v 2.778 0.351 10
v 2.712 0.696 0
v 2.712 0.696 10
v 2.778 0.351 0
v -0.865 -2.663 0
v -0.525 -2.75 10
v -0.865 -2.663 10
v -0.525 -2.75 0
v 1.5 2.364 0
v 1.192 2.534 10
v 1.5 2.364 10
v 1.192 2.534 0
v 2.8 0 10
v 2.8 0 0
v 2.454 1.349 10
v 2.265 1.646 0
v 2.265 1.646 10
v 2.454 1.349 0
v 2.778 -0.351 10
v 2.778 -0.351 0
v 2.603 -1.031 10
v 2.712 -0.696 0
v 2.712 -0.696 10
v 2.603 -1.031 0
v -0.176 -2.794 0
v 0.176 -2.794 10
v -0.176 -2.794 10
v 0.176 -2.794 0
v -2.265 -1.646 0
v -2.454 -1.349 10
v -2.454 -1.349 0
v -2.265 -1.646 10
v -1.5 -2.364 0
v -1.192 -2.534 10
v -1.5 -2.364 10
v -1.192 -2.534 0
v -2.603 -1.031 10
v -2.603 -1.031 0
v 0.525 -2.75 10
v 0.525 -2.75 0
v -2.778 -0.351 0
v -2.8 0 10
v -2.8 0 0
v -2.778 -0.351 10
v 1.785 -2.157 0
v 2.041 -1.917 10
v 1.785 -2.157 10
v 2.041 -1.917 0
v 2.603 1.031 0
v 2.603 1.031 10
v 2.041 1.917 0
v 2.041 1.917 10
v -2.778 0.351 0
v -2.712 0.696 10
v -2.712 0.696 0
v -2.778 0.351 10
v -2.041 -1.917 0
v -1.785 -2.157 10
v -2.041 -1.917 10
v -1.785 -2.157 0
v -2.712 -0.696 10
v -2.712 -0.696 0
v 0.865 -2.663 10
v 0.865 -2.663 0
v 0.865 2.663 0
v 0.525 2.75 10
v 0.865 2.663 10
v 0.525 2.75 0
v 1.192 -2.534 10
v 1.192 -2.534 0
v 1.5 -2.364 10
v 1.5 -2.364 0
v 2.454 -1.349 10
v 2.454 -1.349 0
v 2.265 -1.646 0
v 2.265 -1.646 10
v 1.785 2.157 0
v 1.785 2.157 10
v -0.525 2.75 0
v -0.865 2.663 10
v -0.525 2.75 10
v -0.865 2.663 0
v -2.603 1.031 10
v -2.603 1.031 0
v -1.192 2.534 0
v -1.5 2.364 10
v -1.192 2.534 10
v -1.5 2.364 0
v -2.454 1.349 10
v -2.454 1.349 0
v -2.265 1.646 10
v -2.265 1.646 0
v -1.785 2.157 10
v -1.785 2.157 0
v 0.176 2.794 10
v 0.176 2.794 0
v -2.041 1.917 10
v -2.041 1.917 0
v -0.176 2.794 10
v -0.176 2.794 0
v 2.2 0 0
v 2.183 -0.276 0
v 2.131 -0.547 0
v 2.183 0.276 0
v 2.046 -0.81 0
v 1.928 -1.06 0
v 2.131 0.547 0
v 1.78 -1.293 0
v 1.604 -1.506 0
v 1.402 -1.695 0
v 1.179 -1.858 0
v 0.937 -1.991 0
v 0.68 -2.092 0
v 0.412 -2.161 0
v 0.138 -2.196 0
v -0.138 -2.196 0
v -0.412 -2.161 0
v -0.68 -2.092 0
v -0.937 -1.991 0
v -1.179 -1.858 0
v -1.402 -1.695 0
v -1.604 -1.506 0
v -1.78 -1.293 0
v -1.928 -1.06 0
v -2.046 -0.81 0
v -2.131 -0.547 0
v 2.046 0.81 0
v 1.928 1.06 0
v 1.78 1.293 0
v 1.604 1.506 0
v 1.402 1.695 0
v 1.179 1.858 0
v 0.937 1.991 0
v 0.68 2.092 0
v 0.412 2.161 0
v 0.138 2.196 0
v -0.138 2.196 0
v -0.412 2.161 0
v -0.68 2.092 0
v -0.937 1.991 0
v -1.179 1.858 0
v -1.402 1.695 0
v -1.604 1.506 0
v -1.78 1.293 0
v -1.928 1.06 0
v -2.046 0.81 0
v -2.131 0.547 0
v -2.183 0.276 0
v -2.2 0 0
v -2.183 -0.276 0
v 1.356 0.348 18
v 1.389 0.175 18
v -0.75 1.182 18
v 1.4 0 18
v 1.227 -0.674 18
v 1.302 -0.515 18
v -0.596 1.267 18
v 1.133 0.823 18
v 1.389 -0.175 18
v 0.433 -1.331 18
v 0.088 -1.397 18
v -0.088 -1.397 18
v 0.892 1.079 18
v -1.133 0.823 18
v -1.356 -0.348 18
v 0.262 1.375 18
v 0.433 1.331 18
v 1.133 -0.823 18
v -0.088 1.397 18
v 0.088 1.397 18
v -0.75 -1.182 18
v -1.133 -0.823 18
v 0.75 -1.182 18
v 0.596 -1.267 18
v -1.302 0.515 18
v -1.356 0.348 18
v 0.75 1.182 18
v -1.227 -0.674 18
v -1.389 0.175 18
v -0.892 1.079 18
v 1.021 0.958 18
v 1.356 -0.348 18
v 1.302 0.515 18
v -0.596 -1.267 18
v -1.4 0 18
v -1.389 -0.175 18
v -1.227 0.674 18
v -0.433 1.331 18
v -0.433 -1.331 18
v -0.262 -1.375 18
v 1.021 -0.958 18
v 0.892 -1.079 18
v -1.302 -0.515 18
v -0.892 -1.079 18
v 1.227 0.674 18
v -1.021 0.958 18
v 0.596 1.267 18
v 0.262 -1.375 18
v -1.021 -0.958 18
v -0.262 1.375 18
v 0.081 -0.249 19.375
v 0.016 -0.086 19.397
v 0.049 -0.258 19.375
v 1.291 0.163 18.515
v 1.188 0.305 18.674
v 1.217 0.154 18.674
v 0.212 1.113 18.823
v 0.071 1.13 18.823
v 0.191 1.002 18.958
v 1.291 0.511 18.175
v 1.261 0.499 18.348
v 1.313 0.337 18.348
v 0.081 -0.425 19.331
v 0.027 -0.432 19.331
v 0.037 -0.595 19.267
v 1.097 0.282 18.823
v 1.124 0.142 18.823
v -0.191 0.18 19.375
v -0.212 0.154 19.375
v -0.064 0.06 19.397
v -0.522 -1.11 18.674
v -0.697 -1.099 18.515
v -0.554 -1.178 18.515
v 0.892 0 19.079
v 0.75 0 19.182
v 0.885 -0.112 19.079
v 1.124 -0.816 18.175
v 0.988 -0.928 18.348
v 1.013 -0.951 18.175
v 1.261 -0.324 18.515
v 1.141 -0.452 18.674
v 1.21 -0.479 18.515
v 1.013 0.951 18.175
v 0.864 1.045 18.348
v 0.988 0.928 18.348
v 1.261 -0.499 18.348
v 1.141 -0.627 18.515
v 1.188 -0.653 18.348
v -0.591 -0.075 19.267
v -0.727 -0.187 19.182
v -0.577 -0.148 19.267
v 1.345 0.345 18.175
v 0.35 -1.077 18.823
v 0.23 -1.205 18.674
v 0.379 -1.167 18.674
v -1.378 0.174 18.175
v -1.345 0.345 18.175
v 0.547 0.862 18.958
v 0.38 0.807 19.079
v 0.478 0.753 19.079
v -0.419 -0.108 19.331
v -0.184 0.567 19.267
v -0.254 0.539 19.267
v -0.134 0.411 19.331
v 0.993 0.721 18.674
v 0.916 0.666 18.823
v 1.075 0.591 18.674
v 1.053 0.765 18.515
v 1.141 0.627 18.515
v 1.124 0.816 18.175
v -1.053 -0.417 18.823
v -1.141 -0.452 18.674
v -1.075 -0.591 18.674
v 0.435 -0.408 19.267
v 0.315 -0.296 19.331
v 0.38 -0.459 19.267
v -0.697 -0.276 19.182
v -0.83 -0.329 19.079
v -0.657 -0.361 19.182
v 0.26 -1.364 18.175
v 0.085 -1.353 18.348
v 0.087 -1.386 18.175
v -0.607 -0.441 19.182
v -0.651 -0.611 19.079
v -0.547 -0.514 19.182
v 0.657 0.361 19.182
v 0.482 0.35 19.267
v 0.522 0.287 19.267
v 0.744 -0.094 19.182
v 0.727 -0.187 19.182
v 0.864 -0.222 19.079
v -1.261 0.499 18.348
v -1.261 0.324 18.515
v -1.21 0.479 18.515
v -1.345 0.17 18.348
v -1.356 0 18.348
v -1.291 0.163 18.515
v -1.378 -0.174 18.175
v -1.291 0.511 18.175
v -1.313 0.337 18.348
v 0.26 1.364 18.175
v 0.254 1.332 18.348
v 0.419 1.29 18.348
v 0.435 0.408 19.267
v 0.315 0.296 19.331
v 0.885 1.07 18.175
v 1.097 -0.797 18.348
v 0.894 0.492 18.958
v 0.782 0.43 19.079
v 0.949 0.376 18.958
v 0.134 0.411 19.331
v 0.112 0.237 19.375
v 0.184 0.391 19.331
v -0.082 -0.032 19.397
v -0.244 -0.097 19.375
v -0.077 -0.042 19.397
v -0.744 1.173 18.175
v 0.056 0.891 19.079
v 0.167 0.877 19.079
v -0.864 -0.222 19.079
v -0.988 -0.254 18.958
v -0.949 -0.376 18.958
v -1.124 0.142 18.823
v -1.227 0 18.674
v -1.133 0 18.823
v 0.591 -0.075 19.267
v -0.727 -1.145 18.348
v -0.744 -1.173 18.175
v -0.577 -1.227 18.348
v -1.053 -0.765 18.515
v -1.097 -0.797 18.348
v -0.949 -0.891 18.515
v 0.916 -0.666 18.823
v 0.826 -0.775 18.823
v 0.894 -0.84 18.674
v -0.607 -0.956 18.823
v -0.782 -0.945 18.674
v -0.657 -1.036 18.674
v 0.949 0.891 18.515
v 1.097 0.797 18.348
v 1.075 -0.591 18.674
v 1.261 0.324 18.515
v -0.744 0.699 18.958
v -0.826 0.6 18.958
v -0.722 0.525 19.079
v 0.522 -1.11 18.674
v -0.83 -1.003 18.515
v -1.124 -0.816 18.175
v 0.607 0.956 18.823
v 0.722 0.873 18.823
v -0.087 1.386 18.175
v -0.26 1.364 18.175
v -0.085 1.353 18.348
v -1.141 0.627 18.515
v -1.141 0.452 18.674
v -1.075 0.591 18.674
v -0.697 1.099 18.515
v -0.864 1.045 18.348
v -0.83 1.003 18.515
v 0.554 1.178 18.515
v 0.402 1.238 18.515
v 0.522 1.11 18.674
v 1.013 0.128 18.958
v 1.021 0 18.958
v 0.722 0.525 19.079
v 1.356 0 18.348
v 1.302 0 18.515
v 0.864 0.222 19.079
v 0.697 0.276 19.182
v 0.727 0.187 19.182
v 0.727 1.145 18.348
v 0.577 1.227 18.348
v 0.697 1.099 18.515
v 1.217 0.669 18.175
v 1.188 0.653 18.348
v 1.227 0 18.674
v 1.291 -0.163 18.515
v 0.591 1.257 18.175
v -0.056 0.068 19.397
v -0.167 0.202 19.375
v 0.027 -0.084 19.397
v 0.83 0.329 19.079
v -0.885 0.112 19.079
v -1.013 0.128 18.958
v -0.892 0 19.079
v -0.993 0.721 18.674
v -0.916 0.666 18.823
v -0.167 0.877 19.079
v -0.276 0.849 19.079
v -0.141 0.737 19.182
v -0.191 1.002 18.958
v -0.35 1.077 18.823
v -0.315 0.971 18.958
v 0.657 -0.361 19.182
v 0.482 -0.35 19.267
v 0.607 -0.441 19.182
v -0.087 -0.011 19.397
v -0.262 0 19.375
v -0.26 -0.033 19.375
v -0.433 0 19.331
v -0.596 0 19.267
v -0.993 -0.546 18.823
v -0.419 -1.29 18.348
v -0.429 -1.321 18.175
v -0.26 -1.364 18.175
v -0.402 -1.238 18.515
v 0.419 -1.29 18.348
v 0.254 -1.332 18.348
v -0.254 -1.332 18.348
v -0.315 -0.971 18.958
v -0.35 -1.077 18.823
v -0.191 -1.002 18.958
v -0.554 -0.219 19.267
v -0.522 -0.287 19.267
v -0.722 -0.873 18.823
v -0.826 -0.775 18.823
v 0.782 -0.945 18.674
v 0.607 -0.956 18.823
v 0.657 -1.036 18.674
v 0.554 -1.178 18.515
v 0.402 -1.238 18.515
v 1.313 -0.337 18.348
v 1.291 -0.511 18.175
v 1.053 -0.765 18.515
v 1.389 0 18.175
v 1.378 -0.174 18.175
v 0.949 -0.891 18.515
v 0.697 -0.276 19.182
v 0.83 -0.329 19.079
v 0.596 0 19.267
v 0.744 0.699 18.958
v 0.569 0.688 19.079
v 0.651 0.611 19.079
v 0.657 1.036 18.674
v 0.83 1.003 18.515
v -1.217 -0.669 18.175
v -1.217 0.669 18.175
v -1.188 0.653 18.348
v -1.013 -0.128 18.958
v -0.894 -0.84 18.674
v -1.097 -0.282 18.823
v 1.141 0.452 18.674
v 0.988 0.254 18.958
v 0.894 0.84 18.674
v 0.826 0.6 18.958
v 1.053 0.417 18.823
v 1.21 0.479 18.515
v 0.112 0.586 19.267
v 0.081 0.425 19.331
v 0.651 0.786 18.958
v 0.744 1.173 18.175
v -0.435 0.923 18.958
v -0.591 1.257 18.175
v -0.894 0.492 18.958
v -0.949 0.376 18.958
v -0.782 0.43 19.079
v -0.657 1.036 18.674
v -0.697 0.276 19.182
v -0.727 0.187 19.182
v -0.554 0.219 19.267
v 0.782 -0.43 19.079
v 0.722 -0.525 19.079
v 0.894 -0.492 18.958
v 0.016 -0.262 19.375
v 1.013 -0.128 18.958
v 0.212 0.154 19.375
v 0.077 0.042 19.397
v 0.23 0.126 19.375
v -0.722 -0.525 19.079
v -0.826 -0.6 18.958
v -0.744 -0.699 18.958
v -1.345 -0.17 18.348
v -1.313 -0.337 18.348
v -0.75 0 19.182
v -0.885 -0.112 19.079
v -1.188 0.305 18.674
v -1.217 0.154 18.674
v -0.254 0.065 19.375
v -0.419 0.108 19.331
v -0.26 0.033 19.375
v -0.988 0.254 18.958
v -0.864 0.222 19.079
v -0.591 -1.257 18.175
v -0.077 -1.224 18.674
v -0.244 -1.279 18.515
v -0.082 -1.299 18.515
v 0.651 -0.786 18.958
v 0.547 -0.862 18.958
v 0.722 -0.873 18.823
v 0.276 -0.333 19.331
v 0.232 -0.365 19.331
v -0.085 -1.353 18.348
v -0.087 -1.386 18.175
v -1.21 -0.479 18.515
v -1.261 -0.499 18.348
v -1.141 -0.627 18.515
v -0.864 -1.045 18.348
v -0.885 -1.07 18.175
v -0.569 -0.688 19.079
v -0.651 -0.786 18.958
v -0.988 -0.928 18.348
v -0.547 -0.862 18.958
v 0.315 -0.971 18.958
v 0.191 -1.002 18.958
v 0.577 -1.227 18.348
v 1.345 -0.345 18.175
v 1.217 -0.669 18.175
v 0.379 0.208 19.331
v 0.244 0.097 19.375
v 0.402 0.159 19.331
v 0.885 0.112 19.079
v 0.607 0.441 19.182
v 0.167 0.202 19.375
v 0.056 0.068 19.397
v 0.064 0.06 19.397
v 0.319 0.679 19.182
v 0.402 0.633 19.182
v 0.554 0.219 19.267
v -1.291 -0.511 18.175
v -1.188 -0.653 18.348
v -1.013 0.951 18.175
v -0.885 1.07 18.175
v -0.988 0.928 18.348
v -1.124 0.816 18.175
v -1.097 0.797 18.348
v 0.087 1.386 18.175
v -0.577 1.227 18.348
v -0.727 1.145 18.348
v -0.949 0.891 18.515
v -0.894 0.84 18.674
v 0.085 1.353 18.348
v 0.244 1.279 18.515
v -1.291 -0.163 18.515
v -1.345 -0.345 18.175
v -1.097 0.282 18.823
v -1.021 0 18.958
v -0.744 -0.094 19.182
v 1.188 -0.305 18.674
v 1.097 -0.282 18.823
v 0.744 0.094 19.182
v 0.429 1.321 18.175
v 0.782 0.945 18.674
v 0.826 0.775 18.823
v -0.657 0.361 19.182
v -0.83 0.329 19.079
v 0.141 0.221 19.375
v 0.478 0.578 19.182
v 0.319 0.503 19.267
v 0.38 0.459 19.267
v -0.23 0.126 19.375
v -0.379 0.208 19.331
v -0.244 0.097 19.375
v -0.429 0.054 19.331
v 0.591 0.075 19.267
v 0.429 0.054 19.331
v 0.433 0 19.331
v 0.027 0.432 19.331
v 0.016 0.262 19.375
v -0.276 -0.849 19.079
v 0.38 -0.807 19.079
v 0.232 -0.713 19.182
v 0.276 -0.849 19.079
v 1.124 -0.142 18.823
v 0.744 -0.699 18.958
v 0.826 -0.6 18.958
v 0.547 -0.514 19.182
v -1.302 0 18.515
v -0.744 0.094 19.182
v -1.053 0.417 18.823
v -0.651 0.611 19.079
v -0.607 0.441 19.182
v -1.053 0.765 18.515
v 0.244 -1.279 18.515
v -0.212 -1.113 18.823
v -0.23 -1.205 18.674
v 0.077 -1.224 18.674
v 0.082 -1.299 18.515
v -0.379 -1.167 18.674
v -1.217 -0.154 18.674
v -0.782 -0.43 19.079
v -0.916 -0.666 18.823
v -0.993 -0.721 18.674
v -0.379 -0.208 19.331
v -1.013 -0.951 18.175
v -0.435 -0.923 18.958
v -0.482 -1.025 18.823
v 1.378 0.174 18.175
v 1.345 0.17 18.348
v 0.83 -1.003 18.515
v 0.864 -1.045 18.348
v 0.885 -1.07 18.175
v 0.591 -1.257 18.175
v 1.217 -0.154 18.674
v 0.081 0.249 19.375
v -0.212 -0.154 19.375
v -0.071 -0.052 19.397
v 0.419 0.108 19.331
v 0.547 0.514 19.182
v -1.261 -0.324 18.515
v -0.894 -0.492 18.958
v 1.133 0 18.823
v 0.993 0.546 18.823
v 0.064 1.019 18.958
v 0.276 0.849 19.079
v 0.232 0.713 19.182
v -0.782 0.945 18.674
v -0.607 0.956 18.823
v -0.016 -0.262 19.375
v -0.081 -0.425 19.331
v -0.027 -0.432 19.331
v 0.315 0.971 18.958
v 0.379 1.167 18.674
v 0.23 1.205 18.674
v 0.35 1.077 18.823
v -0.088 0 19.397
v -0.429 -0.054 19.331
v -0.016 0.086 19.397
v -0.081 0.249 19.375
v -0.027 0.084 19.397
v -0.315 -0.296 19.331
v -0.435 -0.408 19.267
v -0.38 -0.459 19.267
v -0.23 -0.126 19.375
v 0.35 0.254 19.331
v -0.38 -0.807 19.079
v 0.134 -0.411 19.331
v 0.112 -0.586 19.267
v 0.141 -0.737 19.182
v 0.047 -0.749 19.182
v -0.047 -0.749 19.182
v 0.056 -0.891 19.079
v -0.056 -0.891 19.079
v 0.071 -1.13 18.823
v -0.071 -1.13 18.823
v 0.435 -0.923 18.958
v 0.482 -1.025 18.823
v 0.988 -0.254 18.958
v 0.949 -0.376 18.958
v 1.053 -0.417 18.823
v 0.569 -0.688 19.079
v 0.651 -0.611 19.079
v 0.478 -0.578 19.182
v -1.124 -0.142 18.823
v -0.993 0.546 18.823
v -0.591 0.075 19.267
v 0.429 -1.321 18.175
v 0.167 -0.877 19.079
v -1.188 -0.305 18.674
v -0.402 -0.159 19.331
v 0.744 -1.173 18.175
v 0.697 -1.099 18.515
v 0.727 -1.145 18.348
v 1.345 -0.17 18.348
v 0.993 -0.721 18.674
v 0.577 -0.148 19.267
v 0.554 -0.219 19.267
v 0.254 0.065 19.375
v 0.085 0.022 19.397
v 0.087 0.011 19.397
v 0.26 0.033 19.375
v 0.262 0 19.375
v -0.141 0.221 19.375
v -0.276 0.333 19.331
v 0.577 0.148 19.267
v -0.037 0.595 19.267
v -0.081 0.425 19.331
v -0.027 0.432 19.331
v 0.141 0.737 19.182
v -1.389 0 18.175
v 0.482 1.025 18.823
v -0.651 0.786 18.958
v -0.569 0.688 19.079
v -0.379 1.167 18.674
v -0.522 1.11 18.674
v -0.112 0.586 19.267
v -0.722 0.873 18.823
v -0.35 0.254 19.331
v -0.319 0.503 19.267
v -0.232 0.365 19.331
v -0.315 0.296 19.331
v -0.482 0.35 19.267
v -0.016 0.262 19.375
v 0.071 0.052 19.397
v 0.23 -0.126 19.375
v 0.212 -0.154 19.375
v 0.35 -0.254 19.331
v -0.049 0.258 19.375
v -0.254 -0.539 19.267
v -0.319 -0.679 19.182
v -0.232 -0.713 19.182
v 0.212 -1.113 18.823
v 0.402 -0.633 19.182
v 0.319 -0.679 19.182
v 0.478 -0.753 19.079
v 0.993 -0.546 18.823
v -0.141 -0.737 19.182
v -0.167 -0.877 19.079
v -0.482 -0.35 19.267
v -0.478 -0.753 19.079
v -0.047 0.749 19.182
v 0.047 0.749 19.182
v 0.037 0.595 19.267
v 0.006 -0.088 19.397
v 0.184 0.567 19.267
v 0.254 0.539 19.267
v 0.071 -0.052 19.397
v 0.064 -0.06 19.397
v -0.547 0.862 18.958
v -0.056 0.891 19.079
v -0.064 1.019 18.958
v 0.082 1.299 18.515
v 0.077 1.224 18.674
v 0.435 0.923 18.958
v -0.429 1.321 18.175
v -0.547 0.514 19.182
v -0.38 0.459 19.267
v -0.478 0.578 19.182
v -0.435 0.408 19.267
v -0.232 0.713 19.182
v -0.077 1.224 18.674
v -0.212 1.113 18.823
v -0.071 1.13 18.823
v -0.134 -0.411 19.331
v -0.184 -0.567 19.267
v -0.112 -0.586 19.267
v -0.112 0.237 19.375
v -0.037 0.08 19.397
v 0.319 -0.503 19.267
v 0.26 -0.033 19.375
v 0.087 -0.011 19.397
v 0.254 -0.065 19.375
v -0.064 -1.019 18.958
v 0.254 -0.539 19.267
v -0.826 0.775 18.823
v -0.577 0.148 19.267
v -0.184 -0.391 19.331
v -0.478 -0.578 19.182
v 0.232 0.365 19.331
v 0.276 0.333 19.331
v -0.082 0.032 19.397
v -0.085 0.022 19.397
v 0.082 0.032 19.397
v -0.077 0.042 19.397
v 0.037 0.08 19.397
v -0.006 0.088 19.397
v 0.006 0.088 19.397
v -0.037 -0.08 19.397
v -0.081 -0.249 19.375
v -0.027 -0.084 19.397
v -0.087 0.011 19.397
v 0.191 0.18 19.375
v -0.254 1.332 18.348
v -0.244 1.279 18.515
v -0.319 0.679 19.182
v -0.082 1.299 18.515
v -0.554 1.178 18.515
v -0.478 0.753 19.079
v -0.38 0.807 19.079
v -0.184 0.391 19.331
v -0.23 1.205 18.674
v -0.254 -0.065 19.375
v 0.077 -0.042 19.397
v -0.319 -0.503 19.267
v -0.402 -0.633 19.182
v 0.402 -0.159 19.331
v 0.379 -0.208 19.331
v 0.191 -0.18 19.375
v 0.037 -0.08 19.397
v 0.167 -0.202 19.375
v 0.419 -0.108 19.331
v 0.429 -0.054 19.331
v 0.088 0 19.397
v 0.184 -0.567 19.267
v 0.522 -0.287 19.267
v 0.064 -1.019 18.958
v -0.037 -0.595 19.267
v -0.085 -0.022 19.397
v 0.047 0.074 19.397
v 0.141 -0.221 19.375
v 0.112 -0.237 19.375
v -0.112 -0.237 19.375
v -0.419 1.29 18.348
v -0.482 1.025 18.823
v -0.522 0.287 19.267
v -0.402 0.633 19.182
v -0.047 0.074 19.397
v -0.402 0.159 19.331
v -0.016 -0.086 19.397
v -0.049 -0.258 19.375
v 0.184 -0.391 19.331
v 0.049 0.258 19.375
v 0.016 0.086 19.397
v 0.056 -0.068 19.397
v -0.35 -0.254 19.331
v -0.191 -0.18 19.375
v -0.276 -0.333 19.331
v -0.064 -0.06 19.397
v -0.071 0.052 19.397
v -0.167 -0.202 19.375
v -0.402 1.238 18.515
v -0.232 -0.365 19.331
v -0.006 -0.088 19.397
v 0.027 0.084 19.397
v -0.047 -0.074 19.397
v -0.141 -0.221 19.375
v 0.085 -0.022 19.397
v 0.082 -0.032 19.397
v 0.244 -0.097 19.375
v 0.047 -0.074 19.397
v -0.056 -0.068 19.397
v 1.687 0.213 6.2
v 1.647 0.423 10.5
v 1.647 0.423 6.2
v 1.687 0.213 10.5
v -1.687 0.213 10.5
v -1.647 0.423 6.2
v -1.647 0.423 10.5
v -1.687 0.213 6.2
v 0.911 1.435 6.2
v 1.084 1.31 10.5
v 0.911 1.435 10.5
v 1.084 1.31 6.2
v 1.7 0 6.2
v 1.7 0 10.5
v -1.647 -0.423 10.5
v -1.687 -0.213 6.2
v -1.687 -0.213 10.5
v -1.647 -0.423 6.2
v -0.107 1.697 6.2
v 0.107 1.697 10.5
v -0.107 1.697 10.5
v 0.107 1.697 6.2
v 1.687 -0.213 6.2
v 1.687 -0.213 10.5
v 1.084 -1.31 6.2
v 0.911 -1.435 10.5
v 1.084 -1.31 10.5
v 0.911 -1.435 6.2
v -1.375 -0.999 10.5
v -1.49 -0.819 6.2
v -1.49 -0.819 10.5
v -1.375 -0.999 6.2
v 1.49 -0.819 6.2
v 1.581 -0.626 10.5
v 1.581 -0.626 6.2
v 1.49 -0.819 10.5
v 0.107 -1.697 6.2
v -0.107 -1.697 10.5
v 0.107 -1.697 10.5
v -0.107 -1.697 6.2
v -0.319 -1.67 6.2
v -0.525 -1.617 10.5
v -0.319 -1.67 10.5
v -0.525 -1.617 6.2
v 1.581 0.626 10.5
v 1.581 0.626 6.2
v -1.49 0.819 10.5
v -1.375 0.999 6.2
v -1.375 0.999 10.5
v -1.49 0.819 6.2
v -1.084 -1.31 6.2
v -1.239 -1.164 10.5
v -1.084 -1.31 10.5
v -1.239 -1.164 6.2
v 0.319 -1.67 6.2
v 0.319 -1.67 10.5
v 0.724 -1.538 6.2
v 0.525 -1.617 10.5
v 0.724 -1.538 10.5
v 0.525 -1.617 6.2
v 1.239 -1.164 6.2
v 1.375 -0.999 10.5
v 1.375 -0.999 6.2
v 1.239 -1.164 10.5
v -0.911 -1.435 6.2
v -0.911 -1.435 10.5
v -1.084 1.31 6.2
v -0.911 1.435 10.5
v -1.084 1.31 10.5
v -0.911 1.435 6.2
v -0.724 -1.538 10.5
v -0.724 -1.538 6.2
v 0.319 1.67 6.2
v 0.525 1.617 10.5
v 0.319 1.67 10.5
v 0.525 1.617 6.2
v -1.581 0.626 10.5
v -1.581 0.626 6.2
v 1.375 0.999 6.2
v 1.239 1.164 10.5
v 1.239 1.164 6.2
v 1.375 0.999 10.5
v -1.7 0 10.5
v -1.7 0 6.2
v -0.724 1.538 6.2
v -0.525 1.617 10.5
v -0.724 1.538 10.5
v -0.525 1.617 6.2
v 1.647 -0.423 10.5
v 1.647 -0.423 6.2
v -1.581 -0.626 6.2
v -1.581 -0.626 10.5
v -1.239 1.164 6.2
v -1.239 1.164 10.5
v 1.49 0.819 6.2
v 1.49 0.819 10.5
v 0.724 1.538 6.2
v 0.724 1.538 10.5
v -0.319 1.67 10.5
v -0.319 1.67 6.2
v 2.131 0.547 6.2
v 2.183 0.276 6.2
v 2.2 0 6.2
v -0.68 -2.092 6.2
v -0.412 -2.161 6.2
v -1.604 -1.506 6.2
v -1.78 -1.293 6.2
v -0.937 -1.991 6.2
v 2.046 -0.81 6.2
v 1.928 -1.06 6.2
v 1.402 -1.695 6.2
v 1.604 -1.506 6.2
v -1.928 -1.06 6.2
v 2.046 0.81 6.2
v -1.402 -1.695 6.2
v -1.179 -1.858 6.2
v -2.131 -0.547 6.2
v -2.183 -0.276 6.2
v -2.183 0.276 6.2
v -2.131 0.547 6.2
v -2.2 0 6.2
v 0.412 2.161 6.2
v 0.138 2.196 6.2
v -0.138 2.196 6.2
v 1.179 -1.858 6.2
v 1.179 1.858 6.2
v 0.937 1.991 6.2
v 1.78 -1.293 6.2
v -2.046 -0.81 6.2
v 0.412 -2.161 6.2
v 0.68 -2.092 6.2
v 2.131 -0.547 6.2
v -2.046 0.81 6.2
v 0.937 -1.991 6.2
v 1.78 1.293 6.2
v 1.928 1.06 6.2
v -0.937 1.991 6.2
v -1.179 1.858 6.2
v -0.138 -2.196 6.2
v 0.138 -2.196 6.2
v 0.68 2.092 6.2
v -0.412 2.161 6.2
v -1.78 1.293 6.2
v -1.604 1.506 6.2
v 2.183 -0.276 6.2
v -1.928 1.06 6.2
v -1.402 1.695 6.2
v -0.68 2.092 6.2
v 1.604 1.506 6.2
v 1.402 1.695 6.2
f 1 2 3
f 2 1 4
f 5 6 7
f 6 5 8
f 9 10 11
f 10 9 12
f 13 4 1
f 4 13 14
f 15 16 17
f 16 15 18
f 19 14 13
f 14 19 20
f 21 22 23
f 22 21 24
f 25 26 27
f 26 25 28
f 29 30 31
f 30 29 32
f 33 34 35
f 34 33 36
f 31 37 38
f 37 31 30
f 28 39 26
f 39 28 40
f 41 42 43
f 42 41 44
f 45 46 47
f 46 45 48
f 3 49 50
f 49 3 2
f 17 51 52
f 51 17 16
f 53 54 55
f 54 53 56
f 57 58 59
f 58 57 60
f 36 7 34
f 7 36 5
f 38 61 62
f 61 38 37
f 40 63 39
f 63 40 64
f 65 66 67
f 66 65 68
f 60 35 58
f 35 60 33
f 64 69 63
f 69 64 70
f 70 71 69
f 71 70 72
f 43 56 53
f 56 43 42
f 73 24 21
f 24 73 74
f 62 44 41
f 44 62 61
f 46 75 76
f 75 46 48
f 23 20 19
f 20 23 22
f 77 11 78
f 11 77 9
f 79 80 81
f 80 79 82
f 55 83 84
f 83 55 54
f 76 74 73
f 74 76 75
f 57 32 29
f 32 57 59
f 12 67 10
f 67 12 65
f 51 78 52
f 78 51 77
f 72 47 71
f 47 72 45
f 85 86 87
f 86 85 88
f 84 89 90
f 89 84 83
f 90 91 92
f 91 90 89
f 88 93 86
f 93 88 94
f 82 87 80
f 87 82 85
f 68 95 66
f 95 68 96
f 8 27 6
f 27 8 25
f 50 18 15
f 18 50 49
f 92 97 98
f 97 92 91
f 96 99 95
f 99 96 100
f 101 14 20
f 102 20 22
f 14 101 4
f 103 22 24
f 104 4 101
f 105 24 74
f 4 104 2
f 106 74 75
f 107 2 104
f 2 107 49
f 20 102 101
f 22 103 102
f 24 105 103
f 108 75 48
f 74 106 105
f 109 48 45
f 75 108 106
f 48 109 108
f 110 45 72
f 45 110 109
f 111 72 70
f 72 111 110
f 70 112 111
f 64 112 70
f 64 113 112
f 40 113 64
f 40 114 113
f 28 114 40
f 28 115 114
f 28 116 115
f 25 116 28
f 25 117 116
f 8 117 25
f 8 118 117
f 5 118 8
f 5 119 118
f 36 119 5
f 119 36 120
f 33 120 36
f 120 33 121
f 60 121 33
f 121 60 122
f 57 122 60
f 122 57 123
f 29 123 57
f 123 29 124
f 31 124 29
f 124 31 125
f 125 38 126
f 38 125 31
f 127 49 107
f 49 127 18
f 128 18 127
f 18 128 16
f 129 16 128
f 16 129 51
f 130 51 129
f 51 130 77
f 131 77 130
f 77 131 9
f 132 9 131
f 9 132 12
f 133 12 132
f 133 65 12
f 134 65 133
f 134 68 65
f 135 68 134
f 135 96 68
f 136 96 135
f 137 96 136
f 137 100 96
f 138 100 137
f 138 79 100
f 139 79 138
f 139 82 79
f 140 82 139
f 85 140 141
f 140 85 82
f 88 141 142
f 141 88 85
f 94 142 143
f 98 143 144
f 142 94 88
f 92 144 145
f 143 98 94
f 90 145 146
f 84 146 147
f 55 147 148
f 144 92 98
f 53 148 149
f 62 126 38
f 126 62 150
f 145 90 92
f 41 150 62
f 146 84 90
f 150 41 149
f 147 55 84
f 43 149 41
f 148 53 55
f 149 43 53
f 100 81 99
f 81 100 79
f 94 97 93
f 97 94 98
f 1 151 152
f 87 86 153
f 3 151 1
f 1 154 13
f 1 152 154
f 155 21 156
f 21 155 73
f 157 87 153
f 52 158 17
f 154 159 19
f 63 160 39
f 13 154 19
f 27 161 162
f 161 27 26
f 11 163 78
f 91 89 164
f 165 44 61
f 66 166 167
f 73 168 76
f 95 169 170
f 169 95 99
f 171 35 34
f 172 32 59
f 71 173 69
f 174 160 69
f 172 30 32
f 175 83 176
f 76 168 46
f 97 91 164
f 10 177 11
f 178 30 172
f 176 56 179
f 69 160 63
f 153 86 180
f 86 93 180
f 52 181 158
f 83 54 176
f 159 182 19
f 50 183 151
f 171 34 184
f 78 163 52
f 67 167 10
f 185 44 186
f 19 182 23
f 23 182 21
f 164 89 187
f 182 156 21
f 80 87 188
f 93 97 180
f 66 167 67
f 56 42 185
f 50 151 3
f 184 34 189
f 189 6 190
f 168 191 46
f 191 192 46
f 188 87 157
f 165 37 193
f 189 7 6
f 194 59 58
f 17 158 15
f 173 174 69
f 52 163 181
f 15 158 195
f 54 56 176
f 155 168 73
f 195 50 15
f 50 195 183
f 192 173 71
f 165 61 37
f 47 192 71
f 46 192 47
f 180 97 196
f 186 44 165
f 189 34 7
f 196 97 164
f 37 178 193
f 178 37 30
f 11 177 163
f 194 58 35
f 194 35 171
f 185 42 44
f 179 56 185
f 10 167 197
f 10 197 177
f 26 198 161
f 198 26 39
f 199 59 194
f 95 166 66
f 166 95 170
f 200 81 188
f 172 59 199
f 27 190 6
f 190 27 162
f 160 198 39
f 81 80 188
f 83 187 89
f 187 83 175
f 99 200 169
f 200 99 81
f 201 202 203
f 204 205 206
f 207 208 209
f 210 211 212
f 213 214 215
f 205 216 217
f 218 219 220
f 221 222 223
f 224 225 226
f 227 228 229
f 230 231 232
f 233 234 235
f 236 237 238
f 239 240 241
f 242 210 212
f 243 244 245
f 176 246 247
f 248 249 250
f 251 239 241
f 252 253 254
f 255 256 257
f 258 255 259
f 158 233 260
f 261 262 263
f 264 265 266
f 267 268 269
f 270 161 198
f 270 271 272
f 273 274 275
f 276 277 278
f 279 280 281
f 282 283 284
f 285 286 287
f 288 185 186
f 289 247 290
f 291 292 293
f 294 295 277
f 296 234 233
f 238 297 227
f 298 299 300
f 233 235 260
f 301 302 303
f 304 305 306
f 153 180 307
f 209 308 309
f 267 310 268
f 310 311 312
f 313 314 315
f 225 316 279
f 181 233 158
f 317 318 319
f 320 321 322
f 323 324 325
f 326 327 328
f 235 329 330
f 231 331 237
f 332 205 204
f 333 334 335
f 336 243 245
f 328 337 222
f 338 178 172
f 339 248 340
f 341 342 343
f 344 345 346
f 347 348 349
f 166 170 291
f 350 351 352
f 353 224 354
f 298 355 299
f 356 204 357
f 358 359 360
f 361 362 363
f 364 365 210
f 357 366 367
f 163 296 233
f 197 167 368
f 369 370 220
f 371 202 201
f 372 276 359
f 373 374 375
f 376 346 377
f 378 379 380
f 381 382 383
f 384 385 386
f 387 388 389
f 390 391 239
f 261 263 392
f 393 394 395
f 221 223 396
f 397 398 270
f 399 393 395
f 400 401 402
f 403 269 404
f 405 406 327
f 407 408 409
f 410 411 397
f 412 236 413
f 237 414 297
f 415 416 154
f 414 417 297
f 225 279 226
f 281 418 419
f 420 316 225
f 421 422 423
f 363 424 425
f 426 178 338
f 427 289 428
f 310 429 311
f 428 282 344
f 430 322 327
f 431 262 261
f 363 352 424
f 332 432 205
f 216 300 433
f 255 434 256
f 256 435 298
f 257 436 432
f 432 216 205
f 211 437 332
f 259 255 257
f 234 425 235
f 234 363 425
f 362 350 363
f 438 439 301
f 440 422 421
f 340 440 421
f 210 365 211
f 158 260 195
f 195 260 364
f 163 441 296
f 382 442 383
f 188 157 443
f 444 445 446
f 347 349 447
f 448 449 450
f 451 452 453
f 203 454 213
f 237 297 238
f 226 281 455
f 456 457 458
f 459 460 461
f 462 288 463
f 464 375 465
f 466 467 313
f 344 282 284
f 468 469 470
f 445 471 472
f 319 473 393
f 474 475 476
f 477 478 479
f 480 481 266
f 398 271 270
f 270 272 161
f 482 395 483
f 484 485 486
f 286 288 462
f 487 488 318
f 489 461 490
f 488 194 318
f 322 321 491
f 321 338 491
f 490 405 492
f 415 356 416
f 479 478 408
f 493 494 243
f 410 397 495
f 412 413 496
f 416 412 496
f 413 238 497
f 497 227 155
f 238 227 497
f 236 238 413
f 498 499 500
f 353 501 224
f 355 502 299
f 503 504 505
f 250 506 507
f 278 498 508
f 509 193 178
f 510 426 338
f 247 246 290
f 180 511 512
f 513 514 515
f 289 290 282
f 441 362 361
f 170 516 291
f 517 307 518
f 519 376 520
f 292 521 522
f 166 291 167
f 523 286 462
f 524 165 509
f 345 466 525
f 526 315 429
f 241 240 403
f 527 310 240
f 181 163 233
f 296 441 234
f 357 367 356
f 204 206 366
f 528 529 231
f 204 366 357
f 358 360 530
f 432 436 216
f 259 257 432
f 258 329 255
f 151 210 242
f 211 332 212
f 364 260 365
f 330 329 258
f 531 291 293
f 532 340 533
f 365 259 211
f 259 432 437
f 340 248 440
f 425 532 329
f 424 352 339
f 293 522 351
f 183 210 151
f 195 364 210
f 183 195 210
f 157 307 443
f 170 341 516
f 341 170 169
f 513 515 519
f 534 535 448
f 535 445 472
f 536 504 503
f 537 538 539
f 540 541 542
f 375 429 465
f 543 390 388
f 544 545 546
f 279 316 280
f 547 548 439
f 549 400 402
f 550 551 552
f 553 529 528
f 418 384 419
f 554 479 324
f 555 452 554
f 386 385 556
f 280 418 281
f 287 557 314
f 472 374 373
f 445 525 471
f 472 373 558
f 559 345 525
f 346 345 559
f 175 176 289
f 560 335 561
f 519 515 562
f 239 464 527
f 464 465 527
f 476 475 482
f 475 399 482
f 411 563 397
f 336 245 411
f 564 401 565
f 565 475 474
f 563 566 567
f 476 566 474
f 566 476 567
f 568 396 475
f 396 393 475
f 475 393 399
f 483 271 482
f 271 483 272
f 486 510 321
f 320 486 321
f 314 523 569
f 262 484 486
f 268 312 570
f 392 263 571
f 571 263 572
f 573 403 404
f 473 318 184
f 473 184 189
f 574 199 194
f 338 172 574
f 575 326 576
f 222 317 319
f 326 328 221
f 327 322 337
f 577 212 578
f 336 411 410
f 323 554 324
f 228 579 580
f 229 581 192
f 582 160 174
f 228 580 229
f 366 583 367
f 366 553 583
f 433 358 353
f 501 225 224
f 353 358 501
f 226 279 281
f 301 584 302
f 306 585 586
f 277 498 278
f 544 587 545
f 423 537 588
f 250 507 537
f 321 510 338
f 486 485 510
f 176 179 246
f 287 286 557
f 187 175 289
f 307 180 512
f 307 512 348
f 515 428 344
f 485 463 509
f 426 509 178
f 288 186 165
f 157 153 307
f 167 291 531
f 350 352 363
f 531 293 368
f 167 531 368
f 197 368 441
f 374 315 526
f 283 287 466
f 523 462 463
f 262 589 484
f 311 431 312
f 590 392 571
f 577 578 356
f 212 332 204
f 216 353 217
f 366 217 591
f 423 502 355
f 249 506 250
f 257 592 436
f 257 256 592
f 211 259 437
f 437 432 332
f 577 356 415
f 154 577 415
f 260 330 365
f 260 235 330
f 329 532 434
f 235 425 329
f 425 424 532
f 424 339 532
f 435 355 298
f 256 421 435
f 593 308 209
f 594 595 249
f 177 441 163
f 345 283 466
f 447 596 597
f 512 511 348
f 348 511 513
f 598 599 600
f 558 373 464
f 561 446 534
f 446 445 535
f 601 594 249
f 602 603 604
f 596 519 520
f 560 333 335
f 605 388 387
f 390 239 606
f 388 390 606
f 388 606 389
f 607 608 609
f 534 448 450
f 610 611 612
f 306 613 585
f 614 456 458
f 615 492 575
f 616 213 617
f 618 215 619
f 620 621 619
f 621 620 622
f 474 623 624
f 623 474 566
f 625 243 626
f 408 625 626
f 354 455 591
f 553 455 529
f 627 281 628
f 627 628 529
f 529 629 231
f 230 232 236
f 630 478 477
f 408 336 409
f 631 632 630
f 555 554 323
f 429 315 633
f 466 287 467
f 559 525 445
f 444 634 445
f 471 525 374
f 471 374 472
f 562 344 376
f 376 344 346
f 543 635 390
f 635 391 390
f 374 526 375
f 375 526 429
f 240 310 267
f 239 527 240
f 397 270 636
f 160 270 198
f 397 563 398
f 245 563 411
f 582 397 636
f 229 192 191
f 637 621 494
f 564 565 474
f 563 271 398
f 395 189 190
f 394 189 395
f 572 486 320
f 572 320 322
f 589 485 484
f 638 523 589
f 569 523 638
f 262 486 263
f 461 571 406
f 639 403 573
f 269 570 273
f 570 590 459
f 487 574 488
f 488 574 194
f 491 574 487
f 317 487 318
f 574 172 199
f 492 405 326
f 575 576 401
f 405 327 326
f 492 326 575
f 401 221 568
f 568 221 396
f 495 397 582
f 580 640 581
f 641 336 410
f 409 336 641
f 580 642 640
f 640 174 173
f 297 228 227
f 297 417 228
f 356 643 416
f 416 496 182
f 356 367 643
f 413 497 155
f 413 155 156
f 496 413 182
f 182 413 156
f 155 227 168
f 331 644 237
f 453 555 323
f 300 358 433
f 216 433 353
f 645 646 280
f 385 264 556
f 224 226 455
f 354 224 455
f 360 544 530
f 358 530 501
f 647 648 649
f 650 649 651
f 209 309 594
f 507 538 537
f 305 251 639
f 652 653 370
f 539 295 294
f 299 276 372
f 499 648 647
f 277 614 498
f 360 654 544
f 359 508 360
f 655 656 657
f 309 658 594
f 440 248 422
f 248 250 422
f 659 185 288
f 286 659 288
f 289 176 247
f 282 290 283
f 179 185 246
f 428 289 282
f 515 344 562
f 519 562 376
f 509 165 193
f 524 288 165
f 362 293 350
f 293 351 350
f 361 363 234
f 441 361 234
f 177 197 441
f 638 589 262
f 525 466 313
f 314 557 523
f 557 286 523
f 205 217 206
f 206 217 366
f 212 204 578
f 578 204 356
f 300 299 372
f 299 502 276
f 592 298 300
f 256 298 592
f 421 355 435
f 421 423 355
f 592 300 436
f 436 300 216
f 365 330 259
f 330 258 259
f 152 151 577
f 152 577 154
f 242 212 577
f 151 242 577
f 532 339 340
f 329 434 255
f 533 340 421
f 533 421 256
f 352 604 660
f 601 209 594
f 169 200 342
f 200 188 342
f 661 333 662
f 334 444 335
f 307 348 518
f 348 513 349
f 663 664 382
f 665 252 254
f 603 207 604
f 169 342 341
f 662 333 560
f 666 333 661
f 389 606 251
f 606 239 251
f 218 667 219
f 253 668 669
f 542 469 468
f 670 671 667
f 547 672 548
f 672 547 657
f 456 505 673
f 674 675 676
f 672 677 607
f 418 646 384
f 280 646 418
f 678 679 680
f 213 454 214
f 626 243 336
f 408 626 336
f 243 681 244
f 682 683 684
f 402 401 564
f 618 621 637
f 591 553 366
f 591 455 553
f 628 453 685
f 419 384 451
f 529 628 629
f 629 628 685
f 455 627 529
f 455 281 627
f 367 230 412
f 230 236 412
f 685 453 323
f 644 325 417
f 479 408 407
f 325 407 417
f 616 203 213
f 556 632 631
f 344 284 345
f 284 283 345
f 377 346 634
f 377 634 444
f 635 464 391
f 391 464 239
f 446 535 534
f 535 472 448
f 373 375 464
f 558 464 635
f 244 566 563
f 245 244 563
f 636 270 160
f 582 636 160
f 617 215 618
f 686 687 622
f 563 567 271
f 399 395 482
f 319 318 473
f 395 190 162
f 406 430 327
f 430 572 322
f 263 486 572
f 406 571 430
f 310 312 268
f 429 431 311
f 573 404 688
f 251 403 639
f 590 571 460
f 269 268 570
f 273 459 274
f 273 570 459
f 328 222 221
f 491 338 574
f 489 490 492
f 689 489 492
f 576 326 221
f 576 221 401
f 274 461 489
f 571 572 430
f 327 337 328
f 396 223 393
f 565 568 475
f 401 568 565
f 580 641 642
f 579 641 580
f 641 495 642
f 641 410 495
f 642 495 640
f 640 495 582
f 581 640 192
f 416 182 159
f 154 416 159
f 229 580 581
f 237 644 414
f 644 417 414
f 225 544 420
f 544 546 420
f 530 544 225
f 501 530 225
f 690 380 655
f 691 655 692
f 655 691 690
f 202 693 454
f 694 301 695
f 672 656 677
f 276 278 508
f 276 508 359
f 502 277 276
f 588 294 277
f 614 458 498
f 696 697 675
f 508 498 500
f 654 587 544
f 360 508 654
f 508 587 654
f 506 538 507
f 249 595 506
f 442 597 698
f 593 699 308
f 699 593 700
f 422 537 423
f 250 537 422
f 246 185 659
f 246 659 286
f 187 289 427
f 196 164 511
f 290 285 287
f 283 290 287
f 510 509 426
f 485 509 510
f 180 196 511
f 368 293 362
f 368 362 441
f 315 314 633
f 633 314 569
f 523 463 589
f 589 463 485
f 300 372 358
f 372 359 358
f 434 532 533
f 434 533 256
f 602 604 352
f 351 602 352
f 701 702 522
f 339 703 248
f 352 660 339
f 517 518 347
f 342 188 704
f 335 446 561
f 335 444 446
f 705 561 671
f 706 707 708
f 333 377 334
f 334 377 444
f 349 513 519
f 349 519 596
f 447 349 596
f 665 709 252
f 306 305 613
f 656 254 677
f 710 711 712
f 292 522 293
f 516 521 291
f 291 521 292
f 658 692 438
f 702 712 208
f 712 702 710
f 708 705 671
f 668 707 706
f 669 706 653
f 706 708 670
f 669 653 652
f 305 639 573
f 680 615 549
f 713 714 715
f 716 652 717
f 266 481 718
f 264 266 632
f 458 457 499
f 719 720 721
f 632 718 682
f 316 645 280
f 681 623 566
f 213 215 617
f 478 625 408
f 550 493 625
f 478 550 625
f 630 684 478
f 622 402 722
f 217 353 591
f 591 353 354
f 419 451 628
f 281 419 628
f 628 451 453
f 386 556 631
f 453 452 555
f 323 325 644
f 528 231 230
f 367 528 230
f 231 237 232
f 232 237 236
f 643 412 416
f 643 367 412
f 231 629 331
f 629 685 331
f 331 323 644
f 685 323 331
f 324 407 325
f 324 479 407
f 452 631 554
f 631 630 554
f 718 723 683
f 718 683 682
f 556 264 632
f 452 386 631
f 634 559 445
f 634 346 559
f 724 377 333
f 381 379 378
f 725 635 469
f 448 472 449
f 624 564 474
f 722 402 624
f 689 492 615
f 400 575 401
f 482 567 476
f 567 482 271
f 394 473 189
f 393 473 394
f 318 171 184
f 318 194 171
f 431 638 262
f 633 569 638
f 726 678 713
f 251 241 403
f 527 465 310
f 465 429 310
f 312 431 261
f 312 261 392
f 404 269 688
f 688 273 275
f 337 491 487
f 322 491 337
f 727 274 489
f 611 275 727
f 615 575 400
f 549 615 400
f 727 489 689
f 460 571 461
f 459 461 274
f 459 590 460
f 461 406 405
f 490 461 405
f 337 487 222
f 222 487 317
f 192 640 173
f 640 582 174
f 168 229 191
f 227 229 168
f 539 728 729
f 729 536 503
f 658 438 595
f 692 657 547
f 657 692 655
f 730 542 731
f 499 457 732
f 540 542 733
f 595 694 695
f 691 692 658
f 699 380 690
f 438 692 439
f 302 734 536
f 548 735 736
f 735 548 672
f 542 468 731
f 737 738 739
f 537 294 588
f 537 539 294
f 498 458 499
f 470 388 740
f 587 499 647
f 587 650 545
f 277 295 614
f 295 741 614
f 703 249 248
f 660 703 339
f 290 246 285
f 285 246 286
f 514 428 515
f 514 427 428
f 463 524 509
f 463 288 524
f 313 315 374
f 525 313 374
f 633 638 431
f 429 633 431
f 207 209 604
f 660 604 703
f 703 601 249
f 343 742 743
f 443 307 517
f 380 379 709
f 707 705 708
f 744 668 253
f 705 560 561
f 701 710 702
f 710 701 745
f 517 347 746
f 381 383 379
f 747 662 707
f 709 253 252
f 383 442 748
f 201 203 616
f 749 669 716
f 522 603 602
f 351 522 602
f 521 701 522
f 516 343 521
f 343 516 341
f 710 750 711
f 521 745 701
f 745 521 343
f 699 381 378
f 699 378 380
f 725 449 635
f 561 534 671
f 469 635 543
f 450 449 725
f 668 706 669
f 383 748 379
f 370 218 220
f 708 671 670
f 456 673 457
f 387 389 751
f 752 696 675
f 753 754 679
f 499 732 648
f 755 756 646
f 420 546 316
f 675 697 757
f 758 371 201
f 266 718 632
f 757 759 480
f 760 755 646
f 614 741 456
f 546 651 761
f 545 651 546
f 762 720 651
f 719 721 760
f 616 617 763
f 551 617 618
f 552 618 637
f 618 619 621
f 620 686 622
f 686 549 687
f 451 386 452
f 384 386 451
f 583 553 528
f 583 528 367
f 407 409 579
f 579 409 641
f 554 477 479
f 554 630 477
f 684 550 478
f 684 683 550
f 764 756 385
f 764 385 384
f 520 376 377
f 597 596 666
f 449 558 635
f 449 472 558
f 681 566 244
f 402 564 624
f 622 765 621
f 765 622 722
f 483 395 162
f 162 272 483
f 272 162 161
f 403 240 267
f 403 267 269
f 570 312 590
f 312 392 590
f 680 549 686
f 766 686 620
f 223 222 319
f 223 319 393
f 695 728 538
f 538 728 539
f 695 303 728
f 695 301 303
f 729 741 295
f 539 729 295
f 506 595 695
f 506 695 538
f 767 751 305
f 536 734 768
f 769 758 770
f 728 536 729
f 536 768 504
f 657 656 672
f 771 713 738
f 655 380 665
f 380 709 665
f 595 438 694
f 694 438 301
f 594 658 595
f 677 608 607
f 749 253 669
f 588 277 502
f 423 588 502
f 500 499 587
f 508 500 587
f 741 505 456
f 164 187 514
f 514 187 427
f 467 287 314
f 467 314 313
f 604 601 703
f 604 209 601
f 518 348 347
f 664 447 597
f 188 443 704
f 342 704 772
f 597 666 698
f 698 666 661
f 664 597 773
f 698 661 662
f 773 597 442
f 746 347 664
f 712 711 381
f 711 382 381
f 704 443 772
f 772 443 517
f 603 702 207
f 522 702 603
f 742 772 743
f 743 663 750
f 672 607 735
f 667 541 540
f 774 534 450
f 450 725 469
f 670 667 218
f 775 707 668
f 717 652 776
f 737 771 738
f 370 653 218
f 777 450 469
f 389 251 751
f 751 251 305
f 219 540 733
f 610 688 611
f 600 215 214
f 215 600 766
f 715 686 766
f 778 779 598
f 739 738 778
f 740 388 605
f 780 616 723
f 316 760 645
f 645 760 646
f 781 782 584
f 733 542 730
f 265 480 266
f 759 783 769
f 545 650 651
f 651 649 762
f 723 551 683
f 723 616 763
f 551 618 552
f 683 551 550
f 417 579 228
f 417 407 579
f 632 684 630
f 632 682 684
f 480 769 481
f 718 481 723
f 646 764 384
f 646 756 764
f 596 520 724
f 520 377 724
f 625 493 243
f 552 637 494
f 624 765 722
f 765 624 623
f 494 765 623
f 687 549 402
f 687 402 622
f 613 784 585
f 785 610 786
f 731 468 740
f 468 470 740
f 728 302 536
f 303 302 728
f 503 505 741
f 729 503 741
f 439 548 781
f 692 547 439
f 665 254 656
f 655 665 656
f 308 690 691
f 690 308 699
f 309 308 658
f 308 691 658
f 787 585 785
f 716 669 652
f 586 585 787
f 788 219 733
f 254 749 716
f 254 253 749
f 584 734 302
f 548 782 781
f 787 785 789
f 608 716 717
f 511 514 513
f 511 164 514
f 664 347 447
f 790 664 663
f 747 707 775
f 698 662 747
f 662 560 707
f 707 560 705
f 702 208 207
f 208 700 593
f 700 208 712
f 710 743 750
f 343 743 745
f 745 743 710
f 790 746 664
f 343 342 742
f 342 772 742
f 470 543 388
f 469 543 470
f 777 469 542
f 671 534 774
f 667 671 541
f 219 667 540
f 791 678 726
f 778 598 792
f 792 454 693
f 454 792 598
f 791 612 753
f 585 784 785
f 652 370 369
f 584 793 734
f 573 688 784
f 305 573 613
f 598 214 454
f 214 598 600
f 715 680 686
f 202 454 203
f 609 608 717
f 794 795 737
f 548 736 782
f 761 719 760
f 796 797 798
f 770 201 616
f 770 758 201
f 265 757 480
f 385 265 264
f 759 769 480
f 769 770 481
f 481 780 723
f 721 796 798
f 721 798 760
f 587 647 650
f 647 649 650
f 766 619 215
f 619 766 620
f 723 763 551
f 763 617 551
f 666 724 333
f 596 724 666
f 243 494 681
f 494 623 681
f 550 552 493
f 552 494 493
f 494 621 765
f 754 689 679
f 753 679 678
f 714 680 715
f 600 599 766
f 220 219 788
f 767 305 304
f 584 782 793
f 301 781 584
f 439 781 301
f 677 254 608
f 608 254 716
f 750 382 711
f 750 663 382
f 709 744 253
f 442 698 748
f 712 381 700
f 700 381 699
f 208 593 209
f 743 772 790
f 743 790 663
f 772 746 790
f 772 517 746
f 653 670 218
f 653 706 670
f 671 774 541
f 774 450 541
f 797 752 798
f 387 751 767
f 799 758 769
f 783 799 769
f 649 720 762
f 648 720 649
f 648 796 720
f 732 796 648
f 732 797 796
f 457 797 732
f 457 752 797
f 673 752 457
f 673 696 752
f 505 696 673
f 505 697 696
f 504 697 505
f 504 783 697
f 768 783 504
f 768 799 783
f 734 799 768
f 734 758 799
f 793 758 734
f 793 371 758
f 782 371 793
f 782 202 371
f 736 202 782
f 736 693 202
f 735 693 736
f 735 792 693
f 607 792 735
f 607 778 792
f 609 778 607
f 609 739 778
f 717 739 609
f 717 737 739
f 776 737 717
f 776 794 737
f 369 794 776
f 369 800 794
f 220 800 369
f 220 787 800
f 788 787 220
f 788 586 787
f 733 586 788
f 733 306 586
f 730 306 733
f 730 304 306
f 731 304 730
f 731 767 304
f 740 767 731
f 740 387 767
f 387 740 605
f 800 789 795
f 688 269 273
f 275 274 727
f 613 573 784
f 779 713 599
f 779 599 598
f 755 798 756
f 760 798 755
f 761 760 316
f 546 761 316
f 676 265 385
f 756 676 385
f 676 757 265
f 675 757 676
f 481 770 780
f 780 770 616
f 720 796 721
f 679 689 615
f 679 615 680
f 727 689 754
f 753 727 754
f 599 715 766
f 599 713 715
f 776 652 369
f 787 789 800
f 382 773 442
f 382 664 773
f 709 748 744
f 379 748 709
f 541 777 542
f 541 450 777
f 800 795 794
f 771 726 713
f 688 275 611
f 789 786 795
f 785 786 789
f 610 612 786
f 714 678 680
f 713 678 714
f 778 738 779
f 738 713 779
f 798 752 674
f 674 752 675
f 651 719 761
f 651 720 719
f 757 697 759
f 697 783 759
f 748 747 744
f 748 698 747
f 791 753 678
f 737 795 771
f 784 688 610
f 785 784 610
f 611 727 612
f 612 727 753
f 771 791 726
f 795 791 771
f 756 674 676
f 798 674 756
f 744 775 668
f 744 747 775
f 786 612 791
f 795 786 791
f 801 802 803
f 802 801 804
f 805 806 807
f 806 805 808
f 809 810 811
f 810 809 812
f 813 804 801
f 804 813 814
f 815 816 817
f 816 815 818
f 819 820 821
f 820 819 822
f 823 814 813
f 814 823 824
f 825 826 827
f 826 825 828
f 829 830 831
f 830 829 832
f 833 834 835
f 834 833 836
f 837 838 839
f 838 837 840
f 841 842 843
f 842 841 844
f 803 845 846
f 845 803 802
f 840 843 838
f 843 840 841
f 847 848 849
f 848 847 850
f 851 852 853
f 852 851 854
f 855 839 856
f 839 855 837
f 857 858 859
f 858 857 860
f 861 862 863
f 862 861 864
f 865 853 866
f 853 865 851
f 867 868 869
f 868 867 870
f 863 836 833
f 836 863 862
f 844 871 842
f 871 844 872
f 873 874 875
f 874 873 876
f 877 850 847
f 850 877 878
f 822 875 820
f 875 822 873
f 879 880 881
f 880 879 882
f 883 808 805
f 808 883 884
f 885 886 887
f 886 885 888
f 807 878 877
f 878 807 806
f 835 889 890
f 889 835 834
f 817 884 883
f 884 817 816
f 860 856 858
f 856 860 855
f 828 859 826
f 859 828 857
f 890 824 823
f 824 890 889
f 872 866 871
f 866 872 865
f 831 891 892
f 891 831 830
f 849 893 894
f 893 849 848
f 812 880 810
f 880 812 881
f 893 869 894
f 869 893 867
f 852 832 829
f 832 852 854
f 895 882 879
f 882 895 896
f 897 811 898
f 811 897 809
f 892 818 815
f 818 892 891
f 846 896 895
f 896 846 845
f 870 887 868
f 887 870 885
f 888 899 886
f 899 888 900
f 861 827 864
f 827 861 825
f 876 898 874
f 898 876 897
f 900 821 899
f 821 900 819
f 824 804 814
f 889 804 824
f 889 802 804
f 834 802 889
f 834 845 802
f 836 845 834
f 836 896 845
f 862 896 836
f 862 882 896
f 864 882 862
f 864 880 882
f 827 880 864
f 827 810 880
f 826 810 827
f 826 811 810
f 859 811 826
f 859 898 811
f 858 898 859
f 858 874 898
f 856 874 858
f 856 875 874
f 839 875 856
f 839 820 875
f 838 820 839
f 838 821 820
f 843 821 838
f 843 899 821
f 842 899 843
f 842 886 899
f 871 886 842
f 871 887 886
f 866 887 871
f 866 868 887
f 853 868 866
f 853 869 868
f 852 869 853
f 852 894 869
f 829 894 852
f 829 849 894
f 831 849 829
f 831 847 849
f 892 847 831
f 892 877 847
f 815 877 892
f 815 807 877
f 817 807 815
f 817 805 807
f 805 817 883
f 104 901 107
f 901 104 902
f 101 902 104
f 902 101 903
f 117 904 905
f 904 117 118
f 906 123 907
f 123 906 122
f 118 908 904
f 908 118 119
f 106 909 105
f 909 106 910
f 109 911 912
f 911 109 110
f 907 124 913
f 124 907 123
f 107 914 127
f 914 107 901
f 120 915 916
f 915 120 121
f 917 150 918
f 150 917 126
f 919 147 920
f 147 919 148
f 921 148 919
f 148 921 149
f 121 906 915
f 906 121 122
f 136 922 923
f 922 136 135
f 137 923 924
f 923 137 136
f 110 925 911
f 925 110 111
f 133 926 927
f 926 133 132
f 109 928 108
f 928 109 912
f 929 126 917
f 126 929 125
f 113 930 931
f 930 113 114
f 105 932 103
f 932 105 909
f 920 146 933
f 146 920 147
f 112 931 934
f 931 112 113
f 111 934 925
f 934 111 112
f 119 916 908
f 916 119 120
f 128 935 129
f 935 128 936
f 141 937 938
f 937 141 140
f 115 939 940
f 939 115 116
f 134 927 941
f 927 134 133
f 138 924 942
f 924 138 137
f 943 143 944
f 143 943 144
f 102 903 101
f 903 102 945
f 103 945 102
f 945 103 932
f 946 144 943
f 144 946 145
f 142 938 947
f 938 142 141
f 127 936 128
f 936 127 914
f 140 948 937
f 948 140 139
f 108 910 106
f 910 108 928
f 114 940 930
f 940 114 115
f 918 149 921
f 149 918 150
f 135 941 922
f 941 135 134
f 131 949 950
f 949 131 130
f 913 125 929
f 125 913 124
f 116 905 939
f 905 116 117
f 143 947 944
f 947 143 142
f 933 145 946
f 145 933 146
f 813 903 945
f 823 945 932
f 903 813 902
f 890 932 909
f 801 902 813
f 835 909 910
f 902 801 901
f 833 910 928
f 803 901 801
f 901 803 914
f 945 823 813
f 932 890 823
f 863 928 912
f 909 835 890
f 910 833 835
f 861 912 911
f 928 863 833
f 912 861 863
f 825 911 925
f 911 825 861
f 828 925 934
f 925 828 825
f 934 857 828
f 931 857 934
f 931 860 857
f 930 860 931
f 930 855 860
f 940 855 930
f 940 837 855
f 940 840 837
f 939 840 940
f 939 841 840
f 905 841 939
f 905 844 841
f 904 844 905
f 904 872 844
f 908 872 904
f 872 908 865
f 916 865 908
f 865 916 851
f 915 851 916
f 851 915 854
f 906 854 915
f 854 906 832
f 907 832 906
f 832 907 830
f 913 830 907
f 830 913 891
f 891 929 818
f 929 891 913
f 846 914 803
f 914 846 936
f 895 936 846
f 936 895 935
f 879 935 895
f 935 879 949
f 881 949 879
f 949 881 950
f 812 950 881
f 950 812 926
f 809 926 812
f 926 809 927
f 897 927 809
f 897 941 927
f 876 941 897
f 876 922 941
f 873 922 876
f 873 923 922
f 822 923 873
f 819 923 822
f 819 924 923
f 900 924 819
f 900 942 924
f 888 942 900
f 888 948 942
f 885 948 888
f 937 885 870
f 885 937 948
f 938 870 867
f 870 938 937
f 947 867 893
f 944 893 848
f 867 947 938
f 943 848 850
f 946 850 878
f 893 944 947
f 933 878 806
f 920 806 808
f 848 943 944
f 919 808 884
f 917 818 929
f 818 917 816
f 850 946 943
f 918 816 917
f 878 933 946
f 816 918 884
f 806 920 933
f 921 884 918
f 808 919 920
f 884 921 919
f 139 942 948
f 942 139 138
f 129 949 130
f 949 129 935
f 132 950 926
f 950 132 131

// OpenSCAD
$fn = 50;
height = 18;

taper_height = 8;
hole_diameter = 3.4;
insert_diameter = 4.6;
insert_height = 5.7;
outer_diameter = insert_diameter + 1;
fin_width = outer_diameter + 8;
fin_thickness = 2;
fin_offset = 2;

module buffer_extrude(depth, buffer=0.5) {
    translate([0, 0, -buffer]) {
        linear_extrude(depth+buffer*2) {
            children();
        }
    }
}

module screw_hole(x, y, depth, d ) {
    buffer_extrude(depth, 0.5) {
        circle(d=d);
    }
}



difference() {
    union() {
        linear_extrude(height - taper_height) {
            circle(d=outer_diameter);
        }
        translate([0, 0, height - taper_height]) {
            linear_extrude(taper_height, scale=0.5) {
                circle(d=outer_diameter);
            }
        }
        translate([0, 0, height]) {
            sphere(d = outer_diameter / 2);
        }
    }
    screw_hole(0, 0, height - taper_height, hole_diameter);
    screw_hole(0, 0, , insert_height, insert_diameter - 0.2);
}
